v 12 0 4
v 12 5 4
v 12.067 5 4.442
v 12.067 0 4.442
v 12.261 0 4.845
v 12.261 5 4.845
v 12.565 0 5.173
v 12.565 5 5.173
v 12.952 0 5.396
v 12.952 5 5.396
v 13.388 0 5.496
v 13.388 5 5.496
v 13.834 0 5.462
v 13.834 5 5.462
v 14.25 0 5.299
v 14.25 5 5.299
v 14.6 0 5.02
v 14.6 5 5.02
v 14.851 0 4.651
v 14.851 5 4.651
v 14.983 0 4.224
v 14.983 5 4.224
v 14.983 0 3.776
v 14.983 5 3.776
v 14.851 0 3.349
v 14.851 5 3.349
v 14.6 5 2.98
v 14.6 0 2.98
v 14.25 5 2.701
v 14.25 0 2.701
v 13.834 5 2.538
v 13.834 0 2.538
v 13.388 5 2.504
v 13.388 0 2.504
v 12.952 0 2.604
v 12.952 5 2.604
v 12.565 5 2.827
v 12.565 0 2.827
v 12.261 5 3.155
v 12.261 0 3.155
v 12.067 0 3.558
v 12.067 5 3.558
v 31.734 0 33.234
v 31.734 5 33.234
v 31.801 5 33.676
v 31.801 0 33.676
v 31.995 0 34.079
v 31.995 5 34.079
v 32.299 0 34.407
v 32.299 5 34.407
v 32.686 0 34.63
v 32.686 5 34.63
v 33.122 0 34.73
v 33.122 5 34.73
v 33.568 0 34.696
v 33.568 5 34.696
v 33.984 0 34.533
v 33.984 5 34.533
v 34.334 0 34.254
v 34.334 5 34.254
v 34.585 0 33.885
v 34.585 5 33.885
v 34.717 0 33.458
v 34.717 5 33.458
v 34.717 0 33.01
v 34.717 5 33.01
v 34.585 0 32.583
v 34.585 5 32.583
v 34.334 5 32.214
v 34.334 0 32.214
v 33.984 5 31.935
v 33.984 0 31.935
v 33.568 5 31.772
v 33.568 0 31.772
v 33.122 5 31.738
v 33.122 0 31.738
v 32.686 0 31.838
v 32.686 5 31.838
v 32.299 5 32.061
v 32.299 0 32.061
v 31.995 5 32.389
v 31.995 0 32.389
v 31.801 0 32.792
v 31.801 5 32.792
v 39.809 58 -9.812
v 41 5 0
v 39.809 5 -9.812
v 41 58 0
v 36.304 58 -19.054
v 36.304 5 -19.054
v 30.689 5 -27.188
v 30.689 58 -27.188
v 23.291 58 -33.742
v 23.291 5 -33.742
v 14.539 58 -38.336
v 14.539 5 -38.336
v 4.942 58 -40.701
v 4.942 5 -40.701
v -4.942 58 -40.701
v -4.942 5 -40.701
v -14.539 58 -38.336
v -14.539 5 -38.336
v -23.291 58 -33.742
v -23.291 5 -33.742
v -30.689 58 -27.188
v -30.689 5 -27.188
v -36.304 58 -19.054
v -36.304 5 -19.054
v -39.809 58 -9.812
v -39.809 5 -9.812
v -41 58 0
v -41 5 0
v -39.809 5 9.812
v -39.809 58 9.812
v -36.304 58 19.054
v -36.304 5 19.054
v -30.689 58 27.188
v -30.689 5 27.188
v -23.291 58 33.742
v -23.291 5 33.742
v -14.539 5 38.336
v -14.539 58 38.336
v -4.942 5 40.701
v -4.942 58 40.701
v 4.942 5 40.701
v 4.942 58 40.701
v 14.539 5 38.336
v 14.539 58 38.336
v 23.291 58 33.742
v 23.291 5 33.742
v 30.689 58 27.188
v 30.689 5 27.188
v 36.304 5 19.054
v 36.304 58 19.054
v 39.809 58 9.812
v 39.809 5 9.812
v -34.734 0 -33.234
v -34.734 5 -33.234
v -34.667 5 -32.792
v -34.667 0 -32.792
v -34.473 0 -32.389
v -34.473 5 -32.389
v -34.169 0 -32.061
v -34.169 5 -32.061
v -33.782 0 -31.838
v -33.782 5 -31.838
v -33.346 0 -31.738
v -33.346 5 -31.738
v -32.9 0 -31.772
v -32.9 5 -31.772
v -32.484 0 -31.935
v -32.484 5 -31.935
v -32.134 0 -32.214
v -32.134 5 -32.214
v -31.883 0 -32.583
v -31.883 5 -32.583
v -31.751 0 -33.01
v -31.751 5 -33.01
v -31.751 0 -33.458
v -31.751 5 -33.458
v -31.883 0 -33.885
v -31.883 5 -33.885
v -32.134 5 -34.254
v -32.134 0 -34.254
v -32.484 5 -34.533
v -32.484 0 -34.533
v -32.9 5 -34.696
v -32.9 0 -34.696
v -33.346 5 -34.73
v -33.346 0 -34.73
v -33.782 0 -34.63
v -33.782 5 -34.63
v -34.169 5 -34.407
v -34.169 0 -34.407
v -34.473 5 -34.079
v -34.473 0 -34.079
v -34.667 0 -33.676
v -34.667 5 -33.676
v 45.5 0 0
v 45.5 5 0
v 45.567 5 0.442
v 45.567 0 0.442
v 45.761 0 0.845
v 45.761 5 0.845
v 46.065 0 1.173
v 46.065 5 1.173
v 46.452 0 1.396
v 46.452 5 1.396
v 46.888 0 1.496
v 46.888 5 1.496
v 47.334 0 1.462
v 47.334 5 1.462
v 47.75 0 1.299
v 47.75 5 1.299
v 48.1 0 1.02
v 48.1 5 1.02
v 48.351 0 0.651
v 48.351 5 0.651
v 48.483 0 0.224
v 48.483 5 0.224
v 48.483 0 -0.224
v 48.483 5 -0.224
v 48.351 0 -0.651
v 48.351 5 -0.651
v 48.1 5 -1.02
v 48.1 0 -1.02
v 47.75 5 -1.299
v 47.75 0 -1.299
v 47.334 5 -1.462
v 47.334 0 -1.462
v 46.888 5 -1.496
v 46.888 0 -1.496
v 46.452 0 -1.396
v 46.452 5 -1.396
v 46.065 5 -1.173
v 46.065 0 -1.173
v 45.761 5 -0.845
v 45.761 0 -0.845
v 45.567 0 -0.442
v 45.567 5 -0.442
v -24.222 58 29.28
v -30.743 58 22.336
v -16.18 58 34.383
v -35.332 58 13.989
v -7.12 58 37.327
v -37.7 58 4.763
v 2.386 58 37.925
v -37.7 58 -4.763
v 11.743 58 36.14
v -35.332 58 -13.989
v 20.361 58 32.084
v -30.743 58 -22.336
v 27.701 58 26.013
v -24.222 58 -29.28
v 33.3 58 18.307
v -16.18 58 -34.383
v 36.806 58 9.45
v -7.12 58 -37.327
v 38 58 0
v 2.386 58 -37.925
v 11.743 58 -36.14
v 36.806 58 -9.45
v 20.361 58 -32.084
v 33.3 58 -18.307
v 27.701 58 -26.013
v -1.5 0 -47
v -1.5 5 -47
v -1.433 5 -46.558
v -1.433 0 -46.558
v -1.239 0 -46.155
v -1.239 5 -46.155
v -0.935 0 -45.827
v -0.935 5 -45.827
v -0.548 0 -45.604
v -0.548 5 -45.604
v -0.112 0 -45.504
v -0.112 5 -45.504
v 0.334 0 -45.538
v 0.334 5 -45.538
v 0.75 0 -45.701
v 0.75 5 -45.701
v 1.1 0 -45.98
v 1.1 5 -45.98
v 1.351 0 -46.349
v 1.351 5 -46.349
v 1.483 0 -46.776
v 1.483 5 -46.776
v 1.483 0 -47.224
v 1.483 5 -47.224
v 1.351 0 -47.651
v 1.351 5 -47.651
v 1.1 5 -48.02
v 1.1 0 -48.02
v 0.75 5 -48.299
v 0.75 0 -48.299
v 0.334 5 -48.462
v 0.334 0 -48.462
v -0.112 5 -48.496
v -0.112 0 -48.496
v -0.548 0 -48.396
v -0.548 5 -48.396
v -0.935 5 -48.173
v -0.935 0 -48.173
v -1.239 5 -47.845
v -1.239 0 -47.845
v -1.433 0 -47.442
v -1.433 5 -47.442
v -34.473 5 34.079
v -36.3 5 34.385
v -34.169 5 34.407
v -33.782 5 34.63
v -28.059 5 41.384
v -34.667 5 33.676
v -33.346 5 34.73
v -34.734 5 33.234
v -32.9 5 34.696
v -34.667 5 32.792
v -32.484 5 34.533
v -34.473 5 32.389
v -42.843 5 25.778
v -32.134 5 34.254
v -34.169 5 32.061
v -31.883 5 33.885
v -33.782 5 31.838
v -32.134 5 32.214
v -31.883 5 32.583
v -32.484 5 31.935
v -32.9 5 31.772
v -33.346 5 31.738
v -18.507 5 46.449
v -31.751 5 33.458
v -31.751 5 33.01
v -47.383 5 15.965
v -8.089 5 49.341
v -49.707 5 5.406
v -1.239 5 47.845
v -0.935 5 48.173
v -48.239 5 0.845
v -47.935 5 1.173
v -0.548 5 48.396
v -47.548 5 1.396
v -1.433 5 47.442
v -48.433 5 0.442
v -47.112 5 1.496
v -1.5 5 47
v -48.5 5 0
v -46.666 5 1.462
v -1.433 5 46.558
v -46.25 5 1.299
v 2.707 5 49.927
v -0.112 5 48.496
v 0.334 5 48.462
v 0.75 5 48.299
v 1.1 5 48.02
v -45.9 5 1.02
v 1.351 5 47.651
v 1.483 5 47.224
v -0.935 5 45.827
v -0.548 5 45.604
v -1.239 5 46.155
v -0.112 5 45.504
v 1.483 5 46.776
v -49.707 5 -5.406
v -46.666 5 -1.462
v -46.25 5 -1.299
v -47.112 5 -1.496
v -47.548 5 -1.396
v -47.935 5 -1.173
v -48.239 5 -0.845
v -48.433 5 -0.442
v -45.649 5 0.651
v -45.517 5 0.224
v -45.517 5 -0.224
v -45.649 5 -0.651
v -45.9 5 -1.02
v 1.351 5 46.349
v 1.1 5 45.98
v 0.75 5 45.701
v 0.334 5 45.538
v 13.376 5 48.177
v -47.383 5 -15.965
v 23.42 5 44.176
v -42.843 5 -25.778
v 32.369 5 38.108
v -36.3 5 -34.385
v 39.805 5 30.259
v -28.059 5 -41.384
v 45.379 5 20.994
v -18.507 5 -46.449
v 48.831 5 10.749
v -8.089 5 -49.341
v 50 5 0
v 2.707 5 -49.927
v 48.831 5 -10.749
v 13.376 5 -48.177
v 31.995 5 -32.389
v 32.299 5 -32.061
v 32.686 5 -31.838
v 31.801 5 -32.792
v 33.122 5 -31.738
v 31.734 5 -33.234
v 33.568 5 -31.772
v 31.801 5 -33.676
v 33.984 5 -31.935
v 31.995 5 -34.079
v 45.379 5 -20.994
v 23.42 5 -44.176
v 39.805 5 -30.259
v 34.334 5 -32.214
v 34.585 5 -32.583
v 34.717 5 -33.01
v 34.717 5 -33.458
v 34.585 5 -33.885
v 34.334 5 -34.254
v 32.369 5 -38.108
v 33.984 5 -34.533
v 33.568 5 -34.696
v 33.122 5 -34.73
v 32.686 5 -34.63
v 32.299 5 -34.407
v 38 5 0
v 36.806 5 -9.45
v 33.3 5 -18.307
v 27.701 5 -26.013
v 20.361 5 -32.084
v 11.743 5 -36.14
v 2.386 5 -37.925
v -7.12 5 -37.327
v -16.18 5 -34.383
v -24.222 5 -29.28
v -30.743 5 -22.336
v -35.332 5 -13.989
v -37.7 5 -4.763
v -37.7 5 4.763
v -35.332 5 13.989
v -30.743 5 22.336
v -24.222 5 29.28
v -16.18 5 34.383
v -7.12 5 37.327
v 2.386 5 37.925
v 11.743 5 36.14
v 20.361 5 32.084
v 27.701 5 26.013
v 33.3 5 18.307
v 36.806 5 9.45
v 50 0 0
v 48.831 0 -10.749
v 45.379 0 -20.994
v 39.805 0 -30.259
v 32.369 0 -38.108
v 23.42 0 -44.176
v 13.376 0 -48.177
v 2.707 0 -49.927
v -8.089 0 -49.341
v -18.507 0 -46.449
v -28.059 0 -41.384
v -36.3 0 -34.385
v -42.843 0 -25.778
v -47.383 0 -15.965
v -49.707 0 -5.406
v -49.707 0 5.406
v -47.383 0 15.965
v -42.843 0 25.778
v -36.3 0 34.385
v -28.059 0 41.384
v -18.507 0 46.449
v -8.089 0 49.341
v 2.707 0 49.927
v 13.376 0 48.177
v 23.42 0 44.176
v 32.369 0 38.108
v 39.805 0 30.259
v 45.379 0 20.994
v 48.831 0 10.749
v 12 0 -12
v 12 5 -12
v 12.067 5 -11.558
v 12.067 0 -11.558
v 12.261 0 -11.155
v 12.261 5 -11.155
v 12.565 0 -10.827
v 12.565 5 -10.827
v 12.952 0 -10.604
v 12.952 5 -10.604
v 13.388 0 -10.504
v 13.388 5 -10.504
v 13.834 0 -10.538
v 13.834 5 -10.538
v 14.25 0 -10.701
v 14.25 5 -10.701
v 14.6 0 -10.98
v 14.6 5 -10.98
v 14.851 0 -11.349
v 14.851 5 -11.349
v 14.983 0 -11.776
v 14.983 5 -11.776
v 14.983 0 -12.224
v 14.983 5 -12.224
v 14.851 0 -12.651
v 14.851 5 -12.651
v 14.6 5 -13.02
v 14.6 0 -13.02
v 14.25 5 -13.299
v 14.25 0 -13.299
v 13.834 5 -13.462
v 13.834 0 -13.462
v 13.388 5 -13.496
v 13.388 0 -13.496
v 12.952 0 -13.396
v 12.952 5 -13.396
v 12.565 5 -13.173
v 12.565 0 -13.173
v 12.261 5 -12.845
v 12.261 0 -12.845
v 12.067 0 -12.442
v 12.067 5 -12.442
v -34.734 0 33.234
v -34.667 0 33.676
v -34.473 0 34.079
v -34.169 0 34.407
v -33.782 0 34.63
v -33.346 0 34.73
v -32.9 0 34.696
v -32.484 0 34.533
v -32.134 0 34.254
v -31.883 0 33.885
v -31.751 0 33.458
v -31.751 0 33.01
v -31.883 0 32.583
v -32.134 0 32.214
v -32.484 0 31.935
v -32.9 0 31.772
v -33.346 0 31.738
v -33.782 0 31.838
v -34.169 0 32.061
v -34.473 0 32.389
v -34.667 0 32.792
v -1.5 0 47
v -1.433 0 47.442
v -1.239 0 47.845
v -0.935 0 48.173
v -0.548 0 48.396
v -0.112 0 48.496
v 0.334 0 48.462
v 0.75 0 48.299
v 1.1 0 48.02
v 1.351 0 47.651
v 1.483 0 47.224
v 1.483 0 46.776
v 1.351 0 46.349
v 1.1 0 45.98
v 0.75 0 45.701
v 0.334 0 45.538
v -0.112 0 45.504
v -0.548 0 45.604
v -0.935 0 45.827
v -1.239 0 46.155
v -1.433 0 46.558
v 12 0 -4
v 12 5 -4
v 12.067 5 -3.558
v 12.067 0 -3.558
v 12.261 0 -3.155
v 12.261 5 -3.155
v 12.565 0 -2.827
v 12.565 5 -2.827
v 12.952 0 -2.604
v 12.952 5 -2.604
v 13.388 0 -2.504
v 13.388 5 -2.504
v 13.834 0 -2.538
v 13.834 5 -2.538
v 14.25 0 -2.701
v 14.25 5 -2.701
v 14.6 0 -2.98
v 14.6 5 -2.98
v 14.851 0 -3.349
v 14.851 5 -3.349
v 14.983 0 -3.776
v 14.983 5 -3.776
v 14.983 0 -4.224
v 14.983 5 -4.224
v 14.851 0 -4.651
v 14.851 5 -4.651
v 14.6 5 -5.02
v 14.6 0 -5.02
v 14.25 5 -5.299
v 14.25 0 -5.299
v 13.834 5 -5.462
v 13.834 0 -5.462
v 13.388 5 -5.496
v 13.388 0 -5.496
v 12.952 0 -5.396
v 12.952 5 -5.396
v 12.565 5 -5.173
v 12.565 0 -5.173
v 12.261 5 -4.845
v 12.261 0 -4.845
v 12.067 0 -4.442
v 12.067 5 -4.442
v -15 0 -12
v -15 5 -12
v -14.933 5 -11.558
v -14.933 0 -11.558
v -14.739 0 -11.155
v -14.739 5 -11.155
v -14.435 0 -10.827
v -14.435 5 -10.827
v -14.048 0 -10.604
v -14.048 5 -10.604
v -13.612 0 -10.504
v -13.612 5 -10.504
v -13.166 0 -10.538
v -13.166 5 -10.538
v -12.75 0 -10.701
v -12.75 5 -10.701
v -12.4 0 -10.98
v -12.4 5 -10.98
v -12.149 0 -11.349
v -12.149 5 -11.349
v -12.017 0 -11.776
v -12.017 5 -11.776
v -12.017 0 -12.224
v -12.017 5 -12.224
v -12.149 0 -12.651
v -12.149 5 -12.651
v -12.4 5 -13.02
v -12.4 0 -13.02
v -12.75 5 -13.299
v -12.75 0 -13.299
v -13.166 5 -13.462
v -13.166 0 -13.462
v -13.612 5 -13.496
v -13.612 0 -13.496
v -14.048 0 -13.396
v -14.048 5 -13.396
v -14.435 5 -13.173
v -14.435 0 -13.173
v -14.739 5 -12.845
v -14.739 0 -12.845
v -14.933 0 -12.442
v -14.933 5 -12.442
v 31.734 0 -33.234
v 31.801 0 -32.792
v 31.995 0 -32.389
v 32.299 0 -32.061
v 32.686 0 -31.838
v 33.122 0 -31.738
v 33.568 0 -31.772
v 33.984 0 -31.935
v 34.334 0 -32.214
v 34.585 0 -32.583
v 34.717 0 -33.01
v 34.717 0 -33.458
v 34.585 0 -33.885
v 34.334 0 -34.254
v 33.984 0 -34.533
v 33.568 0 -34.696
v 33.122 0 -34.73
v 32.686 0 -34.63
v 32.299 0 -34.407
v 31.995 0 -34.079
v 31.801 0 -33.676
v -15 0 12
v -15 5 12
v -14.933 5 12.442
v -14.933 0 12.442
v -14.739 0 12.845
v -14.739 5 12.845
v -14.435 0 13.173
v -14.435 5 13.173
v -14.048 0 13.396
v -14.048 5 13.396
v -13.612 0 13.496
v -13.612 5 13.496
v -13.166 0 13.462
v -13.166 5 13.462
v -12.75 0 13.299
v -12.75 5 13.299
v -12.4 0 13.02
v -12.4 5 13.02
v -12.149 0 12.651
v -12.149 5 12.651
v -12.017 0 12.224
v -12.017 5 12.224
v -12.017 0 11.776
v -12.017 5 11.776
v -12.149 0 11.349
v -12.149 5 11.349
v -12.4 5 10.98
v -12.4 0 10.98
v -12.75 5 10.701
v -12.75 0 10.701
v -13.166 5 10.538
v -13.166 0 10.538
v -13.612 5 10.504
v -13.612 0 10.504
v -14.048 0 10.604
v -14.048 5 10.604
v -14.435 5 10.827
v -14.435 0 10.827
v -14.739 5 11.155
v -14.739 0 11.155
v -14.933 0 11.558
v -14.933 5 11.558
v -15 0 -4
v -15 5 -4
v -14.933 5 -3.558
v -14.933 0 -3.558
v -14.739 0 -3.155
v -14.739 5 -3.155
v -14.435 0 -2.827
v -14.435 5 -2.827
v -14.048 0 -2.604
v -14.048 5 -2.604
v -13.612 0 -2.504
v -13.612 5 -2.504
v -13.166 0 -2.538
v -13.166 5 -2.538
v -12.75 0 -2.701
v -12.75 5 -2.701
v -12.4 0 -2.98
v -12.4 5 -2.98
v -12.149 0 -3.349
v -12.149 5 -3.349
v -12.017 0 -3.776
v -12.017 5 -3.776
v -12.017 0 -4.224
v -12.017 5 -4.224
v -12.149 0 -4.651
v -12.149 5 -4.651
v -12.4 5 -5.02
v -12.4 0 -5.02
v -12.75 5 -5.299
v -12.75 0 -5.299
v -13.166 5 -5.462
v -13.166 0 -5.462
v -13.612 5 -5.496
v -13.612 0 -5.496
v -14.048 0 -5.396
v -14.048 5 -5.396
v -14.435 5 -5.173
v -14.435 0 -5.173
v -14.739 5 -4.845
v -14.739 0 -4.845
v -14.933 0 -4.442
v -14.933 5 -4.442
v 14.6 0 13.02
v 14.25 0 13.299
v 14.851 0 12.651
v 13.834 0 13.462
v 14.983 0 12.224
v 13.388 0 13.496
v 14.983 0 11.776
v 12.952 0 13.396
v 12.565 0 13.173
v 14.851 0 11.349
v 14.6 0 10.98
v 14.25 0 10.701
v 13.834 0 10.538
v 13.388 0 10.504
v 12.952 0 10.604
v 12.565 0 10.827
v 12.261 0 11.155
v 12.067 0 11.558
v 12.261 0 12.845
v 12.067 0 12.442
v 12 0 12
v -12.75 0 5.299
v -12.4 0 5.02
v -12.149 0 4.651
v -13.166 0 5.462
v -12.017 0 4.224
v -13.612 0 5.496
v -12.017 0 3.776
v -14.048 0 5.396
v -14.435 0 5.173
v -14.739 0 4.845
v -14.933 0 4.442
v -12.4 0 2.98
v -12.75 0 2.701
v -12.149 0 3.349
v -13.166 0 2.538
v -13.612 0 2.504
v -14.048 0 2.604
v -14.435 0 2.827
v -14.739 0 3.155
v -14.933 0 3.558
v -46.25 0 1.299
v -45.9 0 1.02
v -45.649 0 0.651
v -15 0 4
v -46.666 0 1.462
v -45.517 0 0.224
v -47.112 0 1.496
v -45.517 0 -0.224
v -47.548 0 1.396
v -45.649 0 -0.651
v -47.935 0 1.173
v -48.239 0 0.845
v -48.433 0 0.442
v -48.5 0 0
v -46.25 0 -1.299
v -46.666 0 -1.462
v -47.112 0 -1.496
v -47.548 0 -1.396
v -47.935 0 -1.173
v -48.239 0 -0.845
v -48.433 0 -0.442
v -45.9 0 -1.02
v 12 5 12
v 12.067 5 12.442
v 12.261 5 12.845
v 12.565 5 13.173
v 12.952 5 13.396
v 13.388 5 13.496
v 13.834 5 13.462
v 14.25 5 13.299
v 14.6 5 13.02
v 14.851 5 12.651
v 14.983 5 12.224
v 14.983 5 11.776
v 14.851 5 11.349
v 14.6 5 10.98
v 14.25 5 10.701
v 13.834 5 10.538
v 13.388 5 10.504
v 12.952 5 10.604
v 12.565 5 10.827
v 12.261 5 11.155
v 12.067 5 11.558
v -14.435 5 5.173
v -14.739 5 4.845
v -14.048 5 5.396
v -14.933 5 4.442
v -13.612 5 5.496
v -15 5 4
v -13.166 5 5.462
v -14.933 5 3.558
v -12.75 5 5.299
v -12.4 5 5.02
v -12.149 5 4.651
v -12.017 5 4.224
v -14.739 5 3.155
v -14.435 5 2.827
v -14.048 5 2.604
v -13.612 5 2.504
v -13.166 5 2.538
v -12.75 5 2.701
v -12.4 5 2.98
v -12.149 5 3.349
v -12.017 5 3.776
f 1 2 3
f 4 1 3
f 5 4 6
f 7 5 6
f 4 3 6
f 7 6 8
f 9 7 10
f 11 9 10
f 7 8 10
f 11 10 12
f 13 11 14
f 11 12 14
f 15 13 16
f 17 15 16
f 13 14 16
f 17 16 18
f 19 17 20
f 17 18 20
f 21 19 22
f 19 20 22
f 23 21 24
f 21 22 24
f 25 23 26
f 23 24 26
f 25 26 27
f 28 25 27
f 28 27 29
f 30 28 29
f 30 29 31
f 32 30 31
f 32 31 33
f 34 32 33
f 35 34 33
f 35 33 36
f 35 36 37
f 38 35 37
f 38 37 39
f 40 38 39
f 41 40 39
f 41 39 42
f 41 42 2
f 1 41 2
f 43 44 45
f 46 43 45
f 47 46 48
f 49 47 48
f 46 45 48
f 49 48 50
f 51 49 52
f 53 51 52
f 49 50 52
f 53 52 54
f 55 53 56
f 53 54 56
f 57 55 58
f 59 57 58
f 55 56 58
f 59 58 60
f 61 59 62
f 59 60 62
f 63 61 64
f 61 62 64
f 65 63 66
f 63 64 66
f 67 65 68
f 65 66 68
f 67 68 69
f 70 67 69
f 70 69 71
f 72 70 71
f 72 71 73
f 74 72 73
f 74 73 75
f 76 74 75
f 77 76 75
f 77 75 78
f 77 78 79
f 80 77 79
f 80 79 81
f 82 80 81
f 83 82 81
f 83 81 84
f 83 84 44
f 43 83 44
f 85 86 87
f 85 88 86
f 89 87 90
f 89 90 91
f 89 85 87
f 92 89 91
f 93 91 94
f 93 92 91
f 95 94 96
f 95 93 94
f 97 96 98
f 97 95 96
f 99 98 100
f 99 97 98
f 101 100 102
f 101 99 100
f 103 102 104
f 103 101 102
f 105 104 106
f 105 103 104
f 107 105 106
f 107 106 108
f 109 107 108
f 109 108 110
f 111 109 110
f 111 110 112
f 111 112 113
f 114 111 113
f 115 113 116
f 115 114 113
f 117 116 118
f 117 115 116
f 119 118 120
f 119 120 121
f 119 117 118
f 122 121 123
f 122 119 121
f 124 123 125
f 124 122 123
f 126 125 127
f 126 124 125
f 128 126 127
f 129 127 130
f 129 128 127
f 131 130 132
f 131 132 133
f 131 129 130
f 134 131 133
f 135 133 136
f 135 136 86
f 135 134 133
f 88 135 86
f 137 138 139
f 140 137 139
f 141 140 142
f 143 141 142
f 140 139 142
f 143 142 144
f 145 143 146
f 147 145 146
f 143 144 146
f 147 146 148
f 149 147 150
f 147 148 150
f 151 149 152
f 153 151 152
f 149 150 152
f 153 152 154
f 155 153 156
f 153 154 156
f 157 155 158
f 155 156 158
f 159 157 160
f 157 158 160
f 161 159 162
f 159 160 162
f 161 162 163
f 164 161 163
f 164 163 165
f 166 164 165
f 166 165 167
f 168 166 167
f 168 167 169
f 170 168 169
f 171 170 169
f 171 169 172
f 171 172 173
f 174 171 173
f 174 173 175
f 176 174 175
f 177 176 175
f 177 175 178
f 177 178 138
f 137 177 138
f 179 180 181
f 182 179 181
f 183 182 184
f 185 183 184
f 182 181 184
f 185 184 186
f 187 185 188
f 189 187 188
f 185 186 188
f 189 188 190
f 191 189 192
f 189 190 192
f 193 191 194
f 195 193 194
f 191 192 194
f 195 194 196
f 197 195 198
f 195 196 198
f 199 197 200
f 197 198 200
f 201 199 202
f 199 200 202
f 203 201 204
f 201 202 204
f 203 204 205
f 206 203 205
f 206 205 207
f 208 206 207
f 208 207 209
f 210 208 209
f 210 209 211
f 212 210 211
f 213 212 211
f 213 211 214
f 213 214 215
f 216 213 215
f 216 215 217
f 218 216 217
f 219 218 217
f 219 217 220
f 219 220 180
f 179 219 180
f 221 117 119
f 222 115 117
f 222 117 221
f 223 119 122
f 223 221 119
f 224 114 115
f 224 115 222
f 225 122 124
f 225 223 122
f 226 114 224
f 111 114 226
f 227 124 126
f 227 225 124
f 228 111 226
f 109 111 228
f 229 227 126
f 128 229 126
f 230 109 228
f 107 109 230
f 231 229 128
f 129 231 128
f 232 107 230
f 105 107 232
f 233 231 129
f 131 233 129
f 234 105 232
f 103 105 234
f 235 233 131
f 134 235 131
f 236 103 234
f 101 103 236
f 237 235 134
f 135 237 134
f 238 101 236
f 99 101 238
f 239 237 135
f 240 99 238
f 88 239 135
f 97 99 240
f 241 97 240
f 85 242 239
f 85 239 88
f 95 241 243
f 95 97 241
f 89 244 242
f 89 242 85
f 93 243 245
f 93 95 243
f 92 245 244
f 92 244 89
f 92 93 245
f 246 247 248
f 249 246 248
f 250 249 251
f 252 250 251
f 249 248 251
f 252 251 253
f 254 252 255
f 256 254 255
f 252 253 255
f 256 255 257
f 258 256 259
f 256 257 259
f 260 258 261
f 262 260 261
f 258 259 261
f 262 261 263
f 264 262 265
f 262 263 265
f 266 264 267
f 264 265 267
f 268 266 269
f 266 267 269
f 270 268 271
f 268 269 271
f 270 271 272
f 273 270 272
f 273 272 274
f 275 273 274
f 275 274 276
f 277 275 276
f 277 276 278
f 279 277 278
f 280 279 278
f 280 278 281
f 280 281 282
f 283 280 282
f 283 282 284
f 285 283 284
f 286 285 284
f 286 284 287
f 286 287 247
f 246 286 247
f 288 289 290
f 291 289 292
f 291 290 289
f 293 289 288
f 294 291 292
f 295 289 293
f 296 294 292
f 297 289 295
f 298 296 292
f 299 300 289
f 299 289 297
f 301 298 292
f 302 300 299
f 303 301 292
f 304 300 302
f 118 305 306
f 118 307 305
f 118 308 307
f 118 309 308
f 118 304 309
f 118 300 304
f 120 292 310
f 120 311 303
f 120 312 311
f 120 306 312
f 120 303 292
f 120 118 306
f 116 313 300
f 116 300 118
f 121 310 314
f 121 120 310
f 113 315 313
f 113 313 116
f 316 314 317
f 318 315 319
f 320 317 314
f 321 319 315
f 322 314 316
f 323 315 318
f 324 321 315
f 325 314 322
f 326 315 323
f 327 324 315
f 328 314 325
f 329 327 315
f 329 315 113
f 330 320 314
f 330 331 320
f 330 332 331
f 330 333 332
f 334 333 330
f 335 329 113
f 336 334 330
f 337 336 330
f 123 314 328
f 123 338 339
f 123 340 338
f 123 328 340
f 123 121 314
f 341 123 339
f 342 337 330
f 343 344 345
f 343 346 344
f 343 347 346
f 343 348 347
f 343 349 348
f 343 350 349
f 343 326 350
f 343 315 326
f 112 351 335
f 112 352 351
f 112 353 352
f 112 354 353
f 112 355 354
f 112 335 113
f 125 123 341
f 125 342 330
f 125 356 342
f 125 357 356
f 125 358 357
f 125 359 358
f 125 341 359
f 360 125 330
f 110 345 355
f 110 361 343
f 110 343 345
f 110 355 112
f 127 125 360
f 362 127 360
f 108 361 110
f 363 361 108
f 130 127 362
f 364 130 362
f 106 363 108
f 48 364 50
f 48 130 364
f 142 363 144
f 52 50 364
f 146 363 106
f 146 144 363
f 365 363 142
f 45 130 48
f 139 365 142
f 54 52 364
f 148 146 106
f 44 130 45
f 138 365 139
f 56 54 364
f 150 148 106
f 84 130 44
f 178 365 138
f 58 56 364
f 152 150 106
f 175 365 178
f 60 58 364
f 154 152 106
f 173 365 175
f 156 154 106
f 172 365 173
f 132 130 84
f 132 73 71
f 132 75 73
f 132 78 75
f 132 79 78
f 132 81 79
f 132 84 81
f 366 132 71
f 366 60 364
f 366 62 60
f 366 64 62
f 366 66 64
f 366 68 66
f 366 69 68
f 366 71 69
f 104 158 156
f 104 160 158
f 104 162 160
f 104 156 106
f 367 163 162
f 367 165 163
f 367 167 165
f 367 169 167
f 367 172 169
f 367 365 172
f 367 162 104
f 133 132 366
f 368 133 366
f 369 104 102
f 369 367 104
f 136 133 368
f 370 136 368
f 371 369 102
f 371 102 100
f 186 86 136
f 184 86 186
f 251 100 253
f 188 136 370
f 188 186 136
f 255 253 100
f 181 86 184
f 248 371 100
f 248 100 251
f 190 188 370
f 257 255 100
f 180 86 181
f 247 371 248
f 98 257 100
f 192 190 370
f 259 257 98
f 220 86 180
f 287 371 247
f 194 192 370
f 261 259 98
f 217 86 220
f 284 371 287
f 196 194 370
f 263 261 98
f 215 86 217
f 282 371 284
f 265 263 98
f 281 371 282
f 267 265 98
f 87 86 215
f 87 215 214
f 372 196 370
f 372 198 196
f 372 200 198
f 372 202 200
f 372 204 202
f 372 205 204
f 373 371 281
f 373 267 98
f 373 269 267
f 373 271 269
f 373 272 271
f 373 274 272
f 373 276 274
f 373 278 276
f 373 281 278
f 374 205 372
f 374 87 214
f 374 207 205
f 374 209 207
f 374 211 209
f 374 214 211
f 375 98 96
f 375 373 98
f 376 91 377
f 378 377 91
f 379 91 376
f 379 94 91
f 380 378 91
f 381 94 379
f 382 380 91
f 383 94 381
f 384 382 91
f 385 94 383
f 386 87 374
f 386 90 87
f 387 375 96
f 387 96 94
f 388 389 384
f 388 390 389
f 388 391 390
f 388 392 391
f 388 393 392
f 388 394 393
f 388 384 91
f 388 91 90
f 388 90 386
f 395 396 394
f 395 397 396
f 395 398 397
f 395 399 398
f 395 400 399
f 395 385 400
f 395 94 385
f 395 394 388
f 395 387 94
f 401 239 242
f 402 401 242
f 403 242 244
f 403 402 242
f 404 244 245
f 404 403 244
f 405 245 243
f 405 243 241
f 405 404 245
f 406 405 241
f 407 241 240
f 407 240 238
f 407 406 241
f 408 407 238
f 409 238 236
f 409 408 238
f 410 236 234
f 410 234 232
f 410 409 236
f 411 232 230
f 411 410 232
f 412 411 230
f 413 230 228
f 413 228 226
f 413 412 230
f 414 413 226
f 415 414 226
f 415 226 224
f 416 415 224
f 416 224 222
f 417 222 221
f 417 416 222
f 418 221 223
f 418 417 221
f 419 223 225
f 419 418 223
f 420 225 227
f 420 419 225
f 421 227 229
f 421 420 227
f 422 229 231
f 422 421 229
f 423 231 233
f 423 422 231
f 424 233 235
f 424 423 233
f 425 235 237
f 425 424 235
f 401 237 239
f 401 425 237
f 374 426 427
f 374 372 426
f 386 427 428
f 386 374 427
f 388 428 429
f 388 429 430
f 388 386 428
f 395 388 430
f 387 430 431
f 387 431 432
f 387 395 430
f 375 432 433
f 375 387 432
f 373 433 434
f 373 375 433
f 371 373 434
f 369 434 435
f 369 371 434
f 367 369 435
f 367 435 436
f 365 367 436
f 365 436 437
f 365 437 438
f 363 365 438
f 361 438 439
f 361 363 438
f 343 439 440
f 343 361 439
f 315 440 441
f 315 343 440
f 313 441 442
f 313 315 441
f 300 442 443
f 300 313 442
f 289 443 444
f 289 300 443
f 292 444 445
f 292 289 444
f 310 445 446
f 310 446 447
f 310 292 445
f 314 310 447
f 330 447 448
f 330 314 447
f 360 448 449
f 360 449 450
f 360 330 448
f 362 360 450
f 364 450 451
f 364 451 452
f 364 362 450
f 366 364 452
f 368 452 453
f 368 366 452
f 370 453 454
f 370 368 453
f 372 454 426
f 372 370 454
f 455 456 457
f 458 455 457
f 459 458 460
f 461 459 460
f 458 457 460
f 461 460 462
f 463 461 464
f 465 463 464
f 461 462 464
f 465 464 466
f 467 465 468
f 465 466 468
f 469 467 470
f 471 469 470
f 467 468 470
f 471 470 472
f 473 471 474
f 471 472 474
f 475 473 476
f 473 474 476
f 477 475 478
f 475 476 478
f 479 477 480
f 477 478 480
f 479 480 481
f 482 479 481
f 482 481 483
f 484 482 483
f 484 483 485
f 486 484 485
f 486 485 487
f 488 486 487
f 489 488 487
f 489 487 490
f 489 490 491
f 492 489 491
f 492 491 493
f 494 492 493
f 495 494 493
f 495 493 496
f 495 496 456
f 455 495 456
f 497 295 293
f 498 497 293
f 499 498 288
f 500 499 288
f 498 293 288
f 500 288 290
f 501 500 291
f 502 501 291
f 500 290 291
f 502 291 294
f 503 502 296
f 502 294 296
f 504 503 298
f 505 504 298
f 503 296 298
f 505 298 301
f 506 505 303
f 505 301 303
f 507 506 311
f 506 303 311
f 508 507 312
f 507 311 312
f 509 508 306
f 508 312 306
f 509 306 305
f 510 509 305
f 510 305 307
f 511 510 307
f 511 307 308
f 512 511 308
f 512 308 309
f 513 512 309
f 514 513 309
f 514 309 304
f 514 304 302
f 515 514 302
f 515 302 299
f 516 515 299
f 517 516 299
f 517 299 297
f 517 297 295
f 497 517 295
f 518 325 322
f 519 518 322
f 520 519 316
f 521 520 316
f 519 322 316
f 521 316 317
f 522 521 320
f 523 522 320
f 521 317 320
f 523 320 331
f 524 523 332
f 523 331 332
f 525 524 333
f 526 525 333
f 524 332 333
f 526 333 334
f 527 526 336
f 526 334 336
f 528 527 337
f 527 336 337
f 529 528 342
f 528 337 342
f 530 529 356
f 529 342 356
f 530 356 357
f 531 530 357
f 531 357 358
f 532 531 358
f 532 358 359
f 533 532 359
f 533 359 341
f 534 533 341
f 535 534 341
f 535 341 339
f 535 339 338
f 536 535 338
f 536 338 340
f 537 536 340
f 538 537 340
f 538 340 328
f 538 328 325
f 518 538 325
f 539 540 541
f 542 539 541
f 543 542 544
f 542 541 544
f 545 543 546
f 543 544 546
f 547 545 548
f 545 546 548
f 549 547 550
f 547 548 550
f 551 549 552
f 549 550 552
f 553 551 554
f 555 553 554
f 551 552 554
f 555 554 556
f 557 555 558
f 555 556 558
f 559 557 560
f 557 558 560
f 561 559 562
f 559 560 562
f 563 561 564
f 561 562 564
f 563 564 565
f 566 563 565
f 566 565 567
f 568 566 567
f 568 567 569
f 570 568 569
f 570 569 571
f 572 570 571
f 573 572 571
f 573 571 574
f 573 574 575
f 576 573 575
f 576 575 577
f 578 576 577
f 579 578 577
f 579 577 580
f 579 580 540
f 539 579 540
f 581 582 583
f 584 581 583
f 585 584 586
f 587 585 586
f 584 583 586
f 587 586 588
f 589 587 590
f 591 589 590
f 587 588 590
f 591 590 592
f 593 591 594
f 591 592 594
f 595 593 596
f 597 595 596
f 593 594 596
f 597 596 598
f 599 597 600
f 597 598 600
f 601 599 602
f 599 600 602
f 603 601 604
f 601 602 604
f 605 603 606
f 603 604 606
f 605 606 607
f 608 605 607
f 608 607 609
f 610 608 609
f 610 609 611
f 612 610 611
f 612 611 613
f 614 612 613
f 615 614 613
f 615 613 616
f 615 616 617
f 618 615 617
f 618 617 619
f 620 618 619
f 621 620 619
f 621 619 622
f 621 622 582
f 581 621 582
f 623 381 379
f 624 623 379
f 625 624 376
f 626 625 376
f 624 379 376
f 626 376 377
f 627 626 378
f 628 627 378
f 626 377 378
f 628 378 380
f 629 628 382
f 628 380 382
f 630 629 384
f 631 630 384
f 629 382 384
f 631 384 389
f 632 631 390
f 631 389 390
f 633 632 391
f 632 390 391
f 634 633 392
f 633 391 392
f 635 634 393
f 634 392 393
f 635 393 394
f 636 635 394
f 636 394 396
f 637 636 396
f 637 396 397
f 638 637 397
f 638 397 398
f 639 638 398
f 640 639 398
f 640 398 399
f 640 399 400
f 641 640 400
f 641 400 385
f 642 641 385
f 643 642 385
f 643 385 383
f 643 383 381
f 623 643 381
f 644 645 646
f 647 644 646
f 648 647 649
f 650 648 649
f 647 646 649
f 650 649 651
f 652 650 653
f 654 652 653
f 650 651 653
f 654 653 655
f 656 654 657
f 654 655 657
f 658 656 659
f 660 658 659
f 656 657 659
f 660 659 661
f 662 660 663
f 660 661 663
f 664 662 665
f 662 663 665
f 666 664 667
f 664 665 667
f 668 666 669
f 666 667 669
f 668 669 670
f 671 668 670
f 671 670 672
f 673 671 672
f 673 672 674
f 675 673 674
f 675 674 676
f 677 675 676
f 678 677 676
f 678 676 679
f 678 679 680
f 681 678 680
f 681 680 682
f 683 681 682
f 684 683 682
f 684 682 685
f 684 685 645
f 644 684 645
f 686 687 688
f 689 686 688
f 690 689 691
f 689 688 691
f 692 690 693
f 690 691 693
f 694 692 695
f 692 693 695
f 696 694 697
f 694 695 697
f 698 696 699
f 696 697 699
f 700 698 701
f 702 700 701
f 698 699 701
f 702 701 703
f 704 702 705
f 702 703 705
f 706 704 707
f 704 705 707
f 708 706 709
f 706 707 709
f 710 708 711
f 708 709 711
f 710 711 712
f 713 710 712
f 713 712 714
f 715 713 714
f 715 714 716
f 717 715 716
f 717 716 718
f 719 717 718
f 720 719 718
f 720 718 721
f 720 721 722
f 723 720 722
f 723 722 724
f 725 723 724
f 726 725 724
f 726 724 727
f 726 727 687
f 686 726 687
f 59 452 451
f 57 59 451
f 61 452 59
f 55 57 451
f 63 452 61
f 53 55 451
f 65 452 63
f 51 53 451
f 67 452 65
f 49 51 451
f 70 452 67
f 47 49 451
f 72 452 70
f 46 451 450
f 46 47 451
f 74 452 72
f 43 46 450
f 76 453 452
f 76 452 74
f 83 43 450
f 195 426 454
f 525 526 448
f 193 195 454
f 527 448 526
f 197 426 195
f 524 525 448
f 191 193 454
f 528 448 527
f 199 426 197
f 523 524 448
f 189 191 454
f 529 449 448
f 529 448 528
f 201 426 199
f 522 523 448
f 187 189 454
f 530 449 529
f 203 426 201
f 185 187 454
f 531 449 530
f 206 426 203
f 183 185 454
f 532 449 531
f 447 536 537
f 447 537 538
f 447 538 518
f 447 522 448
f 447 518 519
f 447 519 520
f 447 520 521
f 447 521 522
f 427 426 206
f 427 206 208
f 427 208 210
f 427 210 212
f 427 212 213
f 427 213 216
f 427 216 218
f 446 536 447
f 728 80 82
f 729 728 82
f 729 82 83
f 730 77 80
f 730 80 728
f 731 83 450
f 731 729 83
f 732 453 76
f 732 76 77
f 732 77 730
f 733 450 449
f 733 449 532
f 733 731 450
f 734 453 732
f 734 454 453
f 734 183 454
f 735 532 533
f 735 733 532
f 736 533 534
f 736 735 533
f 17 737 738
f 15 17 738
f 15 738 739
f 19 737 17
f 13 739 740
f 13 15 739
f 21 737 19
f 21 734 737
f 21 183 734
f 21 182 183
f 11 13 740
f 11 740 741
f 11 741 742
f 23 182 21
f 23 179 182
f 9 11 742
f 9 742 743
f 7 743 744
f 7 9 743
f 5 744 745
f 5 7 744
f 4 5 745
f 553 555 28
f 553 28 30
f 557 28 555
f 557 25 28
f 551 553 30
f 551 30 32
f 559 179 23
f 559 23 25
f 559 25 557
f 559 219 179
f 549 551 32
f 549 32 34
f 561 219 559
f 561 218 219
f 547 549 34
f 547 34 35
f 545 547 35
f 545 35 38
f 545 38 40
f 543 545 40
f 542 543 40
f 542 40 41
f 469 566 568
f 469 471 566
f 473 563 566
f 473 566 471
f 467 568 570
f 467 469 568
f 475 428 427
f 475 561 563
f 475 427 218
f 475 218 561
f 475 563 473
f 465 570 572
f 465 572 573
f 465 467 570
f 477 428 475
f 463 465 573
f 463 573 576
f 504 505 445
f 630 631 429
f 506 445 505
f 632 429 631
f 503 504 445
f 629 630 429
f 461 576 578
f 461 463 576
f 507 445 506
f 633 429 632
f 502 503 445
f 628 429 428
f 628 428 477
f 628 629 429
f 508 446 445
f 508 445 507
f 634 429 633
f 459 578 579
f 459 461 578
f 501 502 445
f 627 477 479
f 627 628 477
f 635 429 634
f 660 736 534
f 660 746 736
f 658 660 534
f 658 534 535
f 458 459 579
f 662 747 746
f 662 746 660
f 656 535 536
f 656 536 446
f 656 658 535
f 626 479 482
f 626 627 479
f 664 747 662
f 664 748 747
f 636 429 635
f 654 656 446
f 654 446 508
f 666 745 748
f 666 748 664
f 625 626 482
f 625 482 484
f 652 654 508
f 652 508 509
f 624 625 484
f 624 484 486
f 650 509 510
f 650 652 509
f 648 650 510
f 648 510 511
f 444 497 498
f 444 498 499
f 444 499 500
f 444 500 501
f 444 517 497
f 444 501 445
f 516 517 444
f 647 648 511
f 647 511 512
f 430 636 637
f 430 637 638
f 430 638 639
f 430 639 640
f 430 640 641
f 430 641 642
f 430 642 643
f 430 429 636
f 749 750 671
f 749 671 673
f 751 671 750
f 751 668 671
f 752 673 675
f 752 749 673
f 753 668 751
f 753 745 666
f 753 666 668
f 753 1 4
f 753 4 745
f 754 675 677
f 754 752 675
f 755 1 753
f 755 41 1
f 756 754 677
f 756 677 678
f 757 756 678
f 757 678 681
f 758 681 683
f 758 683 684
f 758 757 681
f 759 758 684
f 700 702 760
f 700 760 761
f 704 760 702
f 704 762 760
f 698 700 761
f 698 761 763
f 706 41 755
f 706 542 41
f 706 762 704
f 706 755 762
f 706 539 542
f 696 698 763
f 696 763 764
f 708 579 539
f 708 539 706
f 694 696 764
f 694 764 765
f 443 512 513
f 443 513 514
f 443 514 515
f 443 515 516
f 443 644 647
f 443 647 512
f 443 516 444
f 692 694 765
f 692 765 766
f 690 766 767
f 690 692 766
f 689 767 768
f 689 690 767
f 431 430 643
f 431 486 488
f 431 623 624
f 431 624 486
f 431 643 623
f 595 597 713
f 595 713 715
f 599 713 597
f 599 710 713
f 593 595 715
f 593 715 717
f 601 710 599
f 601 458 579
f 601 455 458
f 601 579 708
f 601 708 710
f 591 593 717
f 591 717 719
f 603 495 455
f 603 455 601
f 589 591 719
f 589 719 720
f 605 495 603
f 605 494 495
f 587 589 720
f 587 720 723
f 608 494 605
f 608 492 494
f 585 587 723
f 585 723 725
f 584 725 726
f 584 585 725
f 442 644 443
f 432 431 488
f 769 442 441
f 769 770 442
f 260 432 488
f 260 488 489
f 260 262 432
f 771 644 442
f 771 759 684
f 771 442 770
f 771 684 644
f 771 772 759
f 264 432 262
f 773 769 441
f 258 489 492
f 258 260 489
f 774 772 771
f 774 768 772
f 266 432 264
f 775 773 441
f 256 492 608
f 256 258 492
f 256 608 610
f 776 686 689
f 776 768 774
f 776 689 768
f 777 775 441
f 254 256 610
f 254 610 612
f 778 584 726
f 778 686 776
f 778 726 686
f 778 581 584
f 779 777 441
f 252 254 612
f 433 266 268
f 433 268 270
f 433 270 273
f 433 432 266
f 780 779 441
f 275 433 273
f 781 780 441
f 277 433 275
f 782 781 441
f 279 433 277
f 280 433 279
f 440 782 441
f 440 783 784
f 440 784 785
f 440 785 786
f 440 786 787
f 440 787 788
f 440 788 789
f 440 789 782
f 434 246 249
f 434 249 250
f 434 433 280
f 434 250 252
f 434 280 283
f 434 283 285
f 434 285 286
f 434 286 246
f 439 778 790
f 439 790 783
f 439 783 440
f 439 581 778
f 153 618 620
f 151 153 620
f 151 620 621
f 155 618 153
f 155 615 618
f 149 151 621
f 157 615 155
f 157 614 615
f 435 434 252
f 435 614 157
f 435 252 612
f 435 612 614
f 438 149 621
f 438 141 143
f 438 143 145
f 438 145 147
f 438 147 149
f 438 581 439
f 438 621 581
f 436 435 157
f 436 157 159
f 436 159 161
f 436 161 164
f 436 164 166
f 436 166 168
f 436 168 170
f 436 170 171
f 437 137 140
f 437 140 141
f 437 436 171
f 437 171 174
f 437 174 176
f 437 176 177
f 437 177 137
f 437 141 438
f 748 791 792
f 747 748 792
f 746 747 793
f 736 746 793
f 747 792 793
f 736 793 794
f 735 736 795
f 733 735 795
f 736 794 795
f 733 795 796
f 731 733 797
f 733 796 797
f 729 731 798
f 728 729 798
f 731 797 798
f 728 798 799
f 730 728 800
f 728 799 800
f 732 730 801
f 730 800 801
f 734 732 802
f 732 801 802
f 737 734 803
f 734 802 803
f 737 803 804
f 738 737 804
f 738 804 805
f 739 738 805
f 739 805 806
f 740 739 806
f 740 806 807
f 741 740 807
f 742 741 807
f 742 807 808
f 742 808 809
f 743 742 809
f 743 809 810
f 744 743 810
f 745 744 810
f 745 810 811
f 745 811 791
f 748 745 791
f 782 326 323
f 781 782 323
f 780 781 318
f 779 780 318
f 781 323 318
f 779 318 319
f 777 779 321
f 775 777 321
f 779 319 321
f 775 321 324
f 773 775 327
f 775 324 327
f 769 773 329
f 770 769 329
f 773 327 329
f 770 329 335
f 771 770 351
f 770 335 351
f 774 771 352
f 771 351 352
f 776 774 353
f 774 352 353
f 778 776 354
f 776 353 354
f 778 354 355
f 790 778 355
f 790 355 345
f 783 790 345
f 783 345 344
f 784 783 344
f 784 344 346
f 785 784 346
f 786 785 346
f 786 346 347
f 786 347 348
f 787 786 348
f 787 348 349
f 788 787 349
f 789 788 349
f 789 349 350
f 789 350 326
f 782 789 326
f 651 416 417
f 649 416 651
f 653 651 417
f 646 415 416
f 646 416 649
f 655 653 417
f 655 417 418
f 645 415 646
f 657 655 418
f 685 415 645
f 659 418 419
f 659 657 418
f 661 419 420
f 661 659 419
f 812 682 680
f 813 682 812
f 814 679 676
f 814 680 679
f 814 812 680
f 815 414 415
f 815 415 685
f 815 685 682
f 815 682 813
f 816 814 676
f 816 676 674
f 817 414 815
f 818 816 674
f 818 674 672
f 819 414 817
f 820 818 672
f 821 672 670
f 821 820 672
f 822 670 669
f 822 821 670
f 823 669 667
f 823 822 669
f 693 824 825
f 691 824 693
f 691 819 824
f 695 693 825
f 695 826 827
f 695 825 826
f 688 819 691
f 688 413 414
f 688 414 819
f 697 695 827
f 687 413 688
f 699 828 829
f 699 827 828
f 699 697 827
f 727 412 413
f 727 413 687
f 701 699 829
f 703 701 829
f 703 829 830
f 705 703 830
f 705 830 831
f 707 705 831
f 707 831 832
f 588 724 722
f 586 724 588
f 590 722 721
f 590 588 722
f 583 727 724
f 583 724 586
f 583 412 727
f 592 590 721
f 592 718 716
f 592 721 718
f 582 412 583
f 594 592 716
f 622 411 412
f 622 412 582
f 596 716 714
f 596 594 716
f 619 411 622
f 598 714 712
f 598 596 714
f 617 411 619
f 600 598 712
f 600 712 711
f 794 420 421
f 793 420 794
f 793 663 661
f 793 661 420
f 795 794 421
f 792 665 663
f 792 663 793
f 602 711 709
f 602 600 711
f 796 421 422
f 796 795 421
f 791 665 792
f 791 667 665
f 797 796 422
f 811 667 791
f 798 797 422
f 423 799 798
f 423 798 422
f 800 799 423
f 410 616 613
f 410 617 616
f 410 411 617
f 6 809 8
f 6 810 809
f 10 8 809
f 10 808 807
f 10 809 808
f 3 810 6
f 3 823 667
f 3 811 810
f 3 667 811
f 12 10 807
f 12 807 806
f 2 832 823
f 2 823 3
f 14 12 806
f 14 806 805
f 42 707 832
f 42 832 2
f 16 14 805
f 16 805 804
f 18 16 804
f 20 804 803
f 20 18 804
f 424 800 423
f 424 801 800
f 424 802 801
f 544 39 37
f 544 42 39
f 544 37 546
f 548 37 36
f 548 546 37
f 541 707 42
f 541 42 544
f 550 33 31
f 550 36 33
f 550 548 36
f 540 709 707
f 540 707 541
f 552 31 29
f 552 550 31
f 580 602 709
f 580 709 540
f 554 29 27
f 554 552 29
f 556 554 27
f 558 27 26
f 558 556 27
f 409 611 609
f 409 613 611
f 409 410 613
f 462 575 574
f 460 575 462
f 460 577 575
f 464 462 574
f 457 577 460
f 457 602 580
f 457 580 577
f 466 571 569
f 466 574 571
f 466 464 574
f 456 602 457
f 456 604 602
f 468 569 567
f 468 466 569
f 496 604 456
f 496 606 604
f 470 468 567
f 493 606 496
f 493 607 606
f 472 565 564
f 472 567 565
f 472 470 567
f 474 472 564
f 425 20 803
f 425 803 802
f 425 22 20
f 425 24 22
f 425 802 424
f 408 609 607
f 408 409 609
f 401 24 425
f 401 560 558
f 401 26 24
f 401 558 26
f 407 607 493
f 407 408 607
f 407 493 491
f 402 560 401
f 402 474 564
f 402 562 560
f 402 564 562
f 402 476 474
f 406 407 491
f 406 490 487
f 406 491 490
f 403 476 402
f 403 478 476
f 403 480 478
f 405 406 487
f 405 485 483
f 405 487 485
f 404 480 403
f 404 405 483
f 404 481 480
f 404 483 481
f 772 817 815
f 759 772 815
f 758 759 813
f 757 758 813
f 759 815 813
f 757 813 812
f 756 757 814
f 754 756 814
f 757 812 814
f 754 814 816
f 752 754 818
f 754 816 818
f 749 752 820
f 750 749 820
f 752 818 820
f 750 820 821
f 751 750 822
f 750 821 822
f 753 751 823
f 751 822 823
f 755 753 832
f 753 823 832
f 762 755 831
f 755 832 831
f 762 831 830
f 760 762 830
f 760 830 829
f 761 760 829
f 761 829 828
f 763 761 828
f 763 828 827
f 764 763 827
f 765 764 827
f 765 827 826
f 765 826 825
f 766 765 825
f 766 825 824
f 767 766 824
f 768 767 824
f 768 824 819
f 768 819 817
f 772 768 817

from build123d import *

# Parameters (mm, degrees)
SKETCH3_R          = 1.5
CUT_EXTRUDE1_DEPTH = 89.36854644


with BuildPart() as part:
    # Sketch2 → Revolve1 (revolve)
    with BuildSketch(Plane.XY):
        Polygon((0, 5), (0, 0), (50, 0), (50, 5), (41, 5), (41, 58), (38, 58), (38, 5), align=None)
    revolve(axis=Axis((0, 0, 0), (0, 1, 0)))

    # Sketch3 → Cut-Extrude1 (cut, through all)
    with BuildSketch(Plane(origin=(0, 5, 0), x_dir=(1, 0, 0), z_dir=(0, 1, 0))):
        with Locations(Location((-13.5, 4, 0), (0, 0, 180))):
            Circle(SKETCH3_R)
        with Locations(Location((13.5, 4, 0), (0, 0, 180))):
            Circle(SKETCH3_R)
        with Locations(Location((-13.5, -4, 0), (0, 0, 180))):
            Circle(SKETCH3_R)
        with Locations(Location((-13.5, -12, 0), (0, 0, 180))):
            Circle(SKETCH3_R)
        with Locations(Location((13.5, -4, 0), (0, 0, 180))):
            Circle(SKETCH3_R)
        with Locations(Location((13.5, -12, 0), (0, 0, 180))):
            Circle(SKETCH3_R)
        with Locations(Location((-13.5, 12, 0), (0, 0, 180))):
            Circle(SKETCH3_R)
        with Locations(Location((13.5, 12, 0), (0, 0, 180))):
            Circle(SKETCH3_R)
        with Locations(Location((0, -47, 0), (0, 0, 180))):
            Circle(SKETCH3_R)
        with Locations(Location((-33.234018716, -33.234018716, 0), (0, 0, 180))):
            Circle(SKETCH3_R)
        with Locations(Location((-47, 0, 0), (0, 0, 180))):
            Circle(SKETCH3_R)
        with Locations(Location((-33.234018716, 33.234018716, 0), (0, 0, 180))):
            Circle(SKETCH3_R)
        with Locations(Location((0, 47, 0), (0, 0, 180))):
            Circle(SKETCH3_R)
        with Locations(Location((33.234018716, 33.234018716, 0), (0, 0, 180))):
            Circle(SKETCH3_R)
        with Locations(Location((47, 0, 0), (0, 0, 180))):
            Circle(SKETCH3_R)
        with Locations(Location((33.234018716, -33.234018716, 0), (0, 0, 180))):
            Circle(SKETCH3_R)
    extrude(amount=-CUT_EXTRUDE1_DEPTH, mode=Mode.SUBTRACT)


solid = part.part
